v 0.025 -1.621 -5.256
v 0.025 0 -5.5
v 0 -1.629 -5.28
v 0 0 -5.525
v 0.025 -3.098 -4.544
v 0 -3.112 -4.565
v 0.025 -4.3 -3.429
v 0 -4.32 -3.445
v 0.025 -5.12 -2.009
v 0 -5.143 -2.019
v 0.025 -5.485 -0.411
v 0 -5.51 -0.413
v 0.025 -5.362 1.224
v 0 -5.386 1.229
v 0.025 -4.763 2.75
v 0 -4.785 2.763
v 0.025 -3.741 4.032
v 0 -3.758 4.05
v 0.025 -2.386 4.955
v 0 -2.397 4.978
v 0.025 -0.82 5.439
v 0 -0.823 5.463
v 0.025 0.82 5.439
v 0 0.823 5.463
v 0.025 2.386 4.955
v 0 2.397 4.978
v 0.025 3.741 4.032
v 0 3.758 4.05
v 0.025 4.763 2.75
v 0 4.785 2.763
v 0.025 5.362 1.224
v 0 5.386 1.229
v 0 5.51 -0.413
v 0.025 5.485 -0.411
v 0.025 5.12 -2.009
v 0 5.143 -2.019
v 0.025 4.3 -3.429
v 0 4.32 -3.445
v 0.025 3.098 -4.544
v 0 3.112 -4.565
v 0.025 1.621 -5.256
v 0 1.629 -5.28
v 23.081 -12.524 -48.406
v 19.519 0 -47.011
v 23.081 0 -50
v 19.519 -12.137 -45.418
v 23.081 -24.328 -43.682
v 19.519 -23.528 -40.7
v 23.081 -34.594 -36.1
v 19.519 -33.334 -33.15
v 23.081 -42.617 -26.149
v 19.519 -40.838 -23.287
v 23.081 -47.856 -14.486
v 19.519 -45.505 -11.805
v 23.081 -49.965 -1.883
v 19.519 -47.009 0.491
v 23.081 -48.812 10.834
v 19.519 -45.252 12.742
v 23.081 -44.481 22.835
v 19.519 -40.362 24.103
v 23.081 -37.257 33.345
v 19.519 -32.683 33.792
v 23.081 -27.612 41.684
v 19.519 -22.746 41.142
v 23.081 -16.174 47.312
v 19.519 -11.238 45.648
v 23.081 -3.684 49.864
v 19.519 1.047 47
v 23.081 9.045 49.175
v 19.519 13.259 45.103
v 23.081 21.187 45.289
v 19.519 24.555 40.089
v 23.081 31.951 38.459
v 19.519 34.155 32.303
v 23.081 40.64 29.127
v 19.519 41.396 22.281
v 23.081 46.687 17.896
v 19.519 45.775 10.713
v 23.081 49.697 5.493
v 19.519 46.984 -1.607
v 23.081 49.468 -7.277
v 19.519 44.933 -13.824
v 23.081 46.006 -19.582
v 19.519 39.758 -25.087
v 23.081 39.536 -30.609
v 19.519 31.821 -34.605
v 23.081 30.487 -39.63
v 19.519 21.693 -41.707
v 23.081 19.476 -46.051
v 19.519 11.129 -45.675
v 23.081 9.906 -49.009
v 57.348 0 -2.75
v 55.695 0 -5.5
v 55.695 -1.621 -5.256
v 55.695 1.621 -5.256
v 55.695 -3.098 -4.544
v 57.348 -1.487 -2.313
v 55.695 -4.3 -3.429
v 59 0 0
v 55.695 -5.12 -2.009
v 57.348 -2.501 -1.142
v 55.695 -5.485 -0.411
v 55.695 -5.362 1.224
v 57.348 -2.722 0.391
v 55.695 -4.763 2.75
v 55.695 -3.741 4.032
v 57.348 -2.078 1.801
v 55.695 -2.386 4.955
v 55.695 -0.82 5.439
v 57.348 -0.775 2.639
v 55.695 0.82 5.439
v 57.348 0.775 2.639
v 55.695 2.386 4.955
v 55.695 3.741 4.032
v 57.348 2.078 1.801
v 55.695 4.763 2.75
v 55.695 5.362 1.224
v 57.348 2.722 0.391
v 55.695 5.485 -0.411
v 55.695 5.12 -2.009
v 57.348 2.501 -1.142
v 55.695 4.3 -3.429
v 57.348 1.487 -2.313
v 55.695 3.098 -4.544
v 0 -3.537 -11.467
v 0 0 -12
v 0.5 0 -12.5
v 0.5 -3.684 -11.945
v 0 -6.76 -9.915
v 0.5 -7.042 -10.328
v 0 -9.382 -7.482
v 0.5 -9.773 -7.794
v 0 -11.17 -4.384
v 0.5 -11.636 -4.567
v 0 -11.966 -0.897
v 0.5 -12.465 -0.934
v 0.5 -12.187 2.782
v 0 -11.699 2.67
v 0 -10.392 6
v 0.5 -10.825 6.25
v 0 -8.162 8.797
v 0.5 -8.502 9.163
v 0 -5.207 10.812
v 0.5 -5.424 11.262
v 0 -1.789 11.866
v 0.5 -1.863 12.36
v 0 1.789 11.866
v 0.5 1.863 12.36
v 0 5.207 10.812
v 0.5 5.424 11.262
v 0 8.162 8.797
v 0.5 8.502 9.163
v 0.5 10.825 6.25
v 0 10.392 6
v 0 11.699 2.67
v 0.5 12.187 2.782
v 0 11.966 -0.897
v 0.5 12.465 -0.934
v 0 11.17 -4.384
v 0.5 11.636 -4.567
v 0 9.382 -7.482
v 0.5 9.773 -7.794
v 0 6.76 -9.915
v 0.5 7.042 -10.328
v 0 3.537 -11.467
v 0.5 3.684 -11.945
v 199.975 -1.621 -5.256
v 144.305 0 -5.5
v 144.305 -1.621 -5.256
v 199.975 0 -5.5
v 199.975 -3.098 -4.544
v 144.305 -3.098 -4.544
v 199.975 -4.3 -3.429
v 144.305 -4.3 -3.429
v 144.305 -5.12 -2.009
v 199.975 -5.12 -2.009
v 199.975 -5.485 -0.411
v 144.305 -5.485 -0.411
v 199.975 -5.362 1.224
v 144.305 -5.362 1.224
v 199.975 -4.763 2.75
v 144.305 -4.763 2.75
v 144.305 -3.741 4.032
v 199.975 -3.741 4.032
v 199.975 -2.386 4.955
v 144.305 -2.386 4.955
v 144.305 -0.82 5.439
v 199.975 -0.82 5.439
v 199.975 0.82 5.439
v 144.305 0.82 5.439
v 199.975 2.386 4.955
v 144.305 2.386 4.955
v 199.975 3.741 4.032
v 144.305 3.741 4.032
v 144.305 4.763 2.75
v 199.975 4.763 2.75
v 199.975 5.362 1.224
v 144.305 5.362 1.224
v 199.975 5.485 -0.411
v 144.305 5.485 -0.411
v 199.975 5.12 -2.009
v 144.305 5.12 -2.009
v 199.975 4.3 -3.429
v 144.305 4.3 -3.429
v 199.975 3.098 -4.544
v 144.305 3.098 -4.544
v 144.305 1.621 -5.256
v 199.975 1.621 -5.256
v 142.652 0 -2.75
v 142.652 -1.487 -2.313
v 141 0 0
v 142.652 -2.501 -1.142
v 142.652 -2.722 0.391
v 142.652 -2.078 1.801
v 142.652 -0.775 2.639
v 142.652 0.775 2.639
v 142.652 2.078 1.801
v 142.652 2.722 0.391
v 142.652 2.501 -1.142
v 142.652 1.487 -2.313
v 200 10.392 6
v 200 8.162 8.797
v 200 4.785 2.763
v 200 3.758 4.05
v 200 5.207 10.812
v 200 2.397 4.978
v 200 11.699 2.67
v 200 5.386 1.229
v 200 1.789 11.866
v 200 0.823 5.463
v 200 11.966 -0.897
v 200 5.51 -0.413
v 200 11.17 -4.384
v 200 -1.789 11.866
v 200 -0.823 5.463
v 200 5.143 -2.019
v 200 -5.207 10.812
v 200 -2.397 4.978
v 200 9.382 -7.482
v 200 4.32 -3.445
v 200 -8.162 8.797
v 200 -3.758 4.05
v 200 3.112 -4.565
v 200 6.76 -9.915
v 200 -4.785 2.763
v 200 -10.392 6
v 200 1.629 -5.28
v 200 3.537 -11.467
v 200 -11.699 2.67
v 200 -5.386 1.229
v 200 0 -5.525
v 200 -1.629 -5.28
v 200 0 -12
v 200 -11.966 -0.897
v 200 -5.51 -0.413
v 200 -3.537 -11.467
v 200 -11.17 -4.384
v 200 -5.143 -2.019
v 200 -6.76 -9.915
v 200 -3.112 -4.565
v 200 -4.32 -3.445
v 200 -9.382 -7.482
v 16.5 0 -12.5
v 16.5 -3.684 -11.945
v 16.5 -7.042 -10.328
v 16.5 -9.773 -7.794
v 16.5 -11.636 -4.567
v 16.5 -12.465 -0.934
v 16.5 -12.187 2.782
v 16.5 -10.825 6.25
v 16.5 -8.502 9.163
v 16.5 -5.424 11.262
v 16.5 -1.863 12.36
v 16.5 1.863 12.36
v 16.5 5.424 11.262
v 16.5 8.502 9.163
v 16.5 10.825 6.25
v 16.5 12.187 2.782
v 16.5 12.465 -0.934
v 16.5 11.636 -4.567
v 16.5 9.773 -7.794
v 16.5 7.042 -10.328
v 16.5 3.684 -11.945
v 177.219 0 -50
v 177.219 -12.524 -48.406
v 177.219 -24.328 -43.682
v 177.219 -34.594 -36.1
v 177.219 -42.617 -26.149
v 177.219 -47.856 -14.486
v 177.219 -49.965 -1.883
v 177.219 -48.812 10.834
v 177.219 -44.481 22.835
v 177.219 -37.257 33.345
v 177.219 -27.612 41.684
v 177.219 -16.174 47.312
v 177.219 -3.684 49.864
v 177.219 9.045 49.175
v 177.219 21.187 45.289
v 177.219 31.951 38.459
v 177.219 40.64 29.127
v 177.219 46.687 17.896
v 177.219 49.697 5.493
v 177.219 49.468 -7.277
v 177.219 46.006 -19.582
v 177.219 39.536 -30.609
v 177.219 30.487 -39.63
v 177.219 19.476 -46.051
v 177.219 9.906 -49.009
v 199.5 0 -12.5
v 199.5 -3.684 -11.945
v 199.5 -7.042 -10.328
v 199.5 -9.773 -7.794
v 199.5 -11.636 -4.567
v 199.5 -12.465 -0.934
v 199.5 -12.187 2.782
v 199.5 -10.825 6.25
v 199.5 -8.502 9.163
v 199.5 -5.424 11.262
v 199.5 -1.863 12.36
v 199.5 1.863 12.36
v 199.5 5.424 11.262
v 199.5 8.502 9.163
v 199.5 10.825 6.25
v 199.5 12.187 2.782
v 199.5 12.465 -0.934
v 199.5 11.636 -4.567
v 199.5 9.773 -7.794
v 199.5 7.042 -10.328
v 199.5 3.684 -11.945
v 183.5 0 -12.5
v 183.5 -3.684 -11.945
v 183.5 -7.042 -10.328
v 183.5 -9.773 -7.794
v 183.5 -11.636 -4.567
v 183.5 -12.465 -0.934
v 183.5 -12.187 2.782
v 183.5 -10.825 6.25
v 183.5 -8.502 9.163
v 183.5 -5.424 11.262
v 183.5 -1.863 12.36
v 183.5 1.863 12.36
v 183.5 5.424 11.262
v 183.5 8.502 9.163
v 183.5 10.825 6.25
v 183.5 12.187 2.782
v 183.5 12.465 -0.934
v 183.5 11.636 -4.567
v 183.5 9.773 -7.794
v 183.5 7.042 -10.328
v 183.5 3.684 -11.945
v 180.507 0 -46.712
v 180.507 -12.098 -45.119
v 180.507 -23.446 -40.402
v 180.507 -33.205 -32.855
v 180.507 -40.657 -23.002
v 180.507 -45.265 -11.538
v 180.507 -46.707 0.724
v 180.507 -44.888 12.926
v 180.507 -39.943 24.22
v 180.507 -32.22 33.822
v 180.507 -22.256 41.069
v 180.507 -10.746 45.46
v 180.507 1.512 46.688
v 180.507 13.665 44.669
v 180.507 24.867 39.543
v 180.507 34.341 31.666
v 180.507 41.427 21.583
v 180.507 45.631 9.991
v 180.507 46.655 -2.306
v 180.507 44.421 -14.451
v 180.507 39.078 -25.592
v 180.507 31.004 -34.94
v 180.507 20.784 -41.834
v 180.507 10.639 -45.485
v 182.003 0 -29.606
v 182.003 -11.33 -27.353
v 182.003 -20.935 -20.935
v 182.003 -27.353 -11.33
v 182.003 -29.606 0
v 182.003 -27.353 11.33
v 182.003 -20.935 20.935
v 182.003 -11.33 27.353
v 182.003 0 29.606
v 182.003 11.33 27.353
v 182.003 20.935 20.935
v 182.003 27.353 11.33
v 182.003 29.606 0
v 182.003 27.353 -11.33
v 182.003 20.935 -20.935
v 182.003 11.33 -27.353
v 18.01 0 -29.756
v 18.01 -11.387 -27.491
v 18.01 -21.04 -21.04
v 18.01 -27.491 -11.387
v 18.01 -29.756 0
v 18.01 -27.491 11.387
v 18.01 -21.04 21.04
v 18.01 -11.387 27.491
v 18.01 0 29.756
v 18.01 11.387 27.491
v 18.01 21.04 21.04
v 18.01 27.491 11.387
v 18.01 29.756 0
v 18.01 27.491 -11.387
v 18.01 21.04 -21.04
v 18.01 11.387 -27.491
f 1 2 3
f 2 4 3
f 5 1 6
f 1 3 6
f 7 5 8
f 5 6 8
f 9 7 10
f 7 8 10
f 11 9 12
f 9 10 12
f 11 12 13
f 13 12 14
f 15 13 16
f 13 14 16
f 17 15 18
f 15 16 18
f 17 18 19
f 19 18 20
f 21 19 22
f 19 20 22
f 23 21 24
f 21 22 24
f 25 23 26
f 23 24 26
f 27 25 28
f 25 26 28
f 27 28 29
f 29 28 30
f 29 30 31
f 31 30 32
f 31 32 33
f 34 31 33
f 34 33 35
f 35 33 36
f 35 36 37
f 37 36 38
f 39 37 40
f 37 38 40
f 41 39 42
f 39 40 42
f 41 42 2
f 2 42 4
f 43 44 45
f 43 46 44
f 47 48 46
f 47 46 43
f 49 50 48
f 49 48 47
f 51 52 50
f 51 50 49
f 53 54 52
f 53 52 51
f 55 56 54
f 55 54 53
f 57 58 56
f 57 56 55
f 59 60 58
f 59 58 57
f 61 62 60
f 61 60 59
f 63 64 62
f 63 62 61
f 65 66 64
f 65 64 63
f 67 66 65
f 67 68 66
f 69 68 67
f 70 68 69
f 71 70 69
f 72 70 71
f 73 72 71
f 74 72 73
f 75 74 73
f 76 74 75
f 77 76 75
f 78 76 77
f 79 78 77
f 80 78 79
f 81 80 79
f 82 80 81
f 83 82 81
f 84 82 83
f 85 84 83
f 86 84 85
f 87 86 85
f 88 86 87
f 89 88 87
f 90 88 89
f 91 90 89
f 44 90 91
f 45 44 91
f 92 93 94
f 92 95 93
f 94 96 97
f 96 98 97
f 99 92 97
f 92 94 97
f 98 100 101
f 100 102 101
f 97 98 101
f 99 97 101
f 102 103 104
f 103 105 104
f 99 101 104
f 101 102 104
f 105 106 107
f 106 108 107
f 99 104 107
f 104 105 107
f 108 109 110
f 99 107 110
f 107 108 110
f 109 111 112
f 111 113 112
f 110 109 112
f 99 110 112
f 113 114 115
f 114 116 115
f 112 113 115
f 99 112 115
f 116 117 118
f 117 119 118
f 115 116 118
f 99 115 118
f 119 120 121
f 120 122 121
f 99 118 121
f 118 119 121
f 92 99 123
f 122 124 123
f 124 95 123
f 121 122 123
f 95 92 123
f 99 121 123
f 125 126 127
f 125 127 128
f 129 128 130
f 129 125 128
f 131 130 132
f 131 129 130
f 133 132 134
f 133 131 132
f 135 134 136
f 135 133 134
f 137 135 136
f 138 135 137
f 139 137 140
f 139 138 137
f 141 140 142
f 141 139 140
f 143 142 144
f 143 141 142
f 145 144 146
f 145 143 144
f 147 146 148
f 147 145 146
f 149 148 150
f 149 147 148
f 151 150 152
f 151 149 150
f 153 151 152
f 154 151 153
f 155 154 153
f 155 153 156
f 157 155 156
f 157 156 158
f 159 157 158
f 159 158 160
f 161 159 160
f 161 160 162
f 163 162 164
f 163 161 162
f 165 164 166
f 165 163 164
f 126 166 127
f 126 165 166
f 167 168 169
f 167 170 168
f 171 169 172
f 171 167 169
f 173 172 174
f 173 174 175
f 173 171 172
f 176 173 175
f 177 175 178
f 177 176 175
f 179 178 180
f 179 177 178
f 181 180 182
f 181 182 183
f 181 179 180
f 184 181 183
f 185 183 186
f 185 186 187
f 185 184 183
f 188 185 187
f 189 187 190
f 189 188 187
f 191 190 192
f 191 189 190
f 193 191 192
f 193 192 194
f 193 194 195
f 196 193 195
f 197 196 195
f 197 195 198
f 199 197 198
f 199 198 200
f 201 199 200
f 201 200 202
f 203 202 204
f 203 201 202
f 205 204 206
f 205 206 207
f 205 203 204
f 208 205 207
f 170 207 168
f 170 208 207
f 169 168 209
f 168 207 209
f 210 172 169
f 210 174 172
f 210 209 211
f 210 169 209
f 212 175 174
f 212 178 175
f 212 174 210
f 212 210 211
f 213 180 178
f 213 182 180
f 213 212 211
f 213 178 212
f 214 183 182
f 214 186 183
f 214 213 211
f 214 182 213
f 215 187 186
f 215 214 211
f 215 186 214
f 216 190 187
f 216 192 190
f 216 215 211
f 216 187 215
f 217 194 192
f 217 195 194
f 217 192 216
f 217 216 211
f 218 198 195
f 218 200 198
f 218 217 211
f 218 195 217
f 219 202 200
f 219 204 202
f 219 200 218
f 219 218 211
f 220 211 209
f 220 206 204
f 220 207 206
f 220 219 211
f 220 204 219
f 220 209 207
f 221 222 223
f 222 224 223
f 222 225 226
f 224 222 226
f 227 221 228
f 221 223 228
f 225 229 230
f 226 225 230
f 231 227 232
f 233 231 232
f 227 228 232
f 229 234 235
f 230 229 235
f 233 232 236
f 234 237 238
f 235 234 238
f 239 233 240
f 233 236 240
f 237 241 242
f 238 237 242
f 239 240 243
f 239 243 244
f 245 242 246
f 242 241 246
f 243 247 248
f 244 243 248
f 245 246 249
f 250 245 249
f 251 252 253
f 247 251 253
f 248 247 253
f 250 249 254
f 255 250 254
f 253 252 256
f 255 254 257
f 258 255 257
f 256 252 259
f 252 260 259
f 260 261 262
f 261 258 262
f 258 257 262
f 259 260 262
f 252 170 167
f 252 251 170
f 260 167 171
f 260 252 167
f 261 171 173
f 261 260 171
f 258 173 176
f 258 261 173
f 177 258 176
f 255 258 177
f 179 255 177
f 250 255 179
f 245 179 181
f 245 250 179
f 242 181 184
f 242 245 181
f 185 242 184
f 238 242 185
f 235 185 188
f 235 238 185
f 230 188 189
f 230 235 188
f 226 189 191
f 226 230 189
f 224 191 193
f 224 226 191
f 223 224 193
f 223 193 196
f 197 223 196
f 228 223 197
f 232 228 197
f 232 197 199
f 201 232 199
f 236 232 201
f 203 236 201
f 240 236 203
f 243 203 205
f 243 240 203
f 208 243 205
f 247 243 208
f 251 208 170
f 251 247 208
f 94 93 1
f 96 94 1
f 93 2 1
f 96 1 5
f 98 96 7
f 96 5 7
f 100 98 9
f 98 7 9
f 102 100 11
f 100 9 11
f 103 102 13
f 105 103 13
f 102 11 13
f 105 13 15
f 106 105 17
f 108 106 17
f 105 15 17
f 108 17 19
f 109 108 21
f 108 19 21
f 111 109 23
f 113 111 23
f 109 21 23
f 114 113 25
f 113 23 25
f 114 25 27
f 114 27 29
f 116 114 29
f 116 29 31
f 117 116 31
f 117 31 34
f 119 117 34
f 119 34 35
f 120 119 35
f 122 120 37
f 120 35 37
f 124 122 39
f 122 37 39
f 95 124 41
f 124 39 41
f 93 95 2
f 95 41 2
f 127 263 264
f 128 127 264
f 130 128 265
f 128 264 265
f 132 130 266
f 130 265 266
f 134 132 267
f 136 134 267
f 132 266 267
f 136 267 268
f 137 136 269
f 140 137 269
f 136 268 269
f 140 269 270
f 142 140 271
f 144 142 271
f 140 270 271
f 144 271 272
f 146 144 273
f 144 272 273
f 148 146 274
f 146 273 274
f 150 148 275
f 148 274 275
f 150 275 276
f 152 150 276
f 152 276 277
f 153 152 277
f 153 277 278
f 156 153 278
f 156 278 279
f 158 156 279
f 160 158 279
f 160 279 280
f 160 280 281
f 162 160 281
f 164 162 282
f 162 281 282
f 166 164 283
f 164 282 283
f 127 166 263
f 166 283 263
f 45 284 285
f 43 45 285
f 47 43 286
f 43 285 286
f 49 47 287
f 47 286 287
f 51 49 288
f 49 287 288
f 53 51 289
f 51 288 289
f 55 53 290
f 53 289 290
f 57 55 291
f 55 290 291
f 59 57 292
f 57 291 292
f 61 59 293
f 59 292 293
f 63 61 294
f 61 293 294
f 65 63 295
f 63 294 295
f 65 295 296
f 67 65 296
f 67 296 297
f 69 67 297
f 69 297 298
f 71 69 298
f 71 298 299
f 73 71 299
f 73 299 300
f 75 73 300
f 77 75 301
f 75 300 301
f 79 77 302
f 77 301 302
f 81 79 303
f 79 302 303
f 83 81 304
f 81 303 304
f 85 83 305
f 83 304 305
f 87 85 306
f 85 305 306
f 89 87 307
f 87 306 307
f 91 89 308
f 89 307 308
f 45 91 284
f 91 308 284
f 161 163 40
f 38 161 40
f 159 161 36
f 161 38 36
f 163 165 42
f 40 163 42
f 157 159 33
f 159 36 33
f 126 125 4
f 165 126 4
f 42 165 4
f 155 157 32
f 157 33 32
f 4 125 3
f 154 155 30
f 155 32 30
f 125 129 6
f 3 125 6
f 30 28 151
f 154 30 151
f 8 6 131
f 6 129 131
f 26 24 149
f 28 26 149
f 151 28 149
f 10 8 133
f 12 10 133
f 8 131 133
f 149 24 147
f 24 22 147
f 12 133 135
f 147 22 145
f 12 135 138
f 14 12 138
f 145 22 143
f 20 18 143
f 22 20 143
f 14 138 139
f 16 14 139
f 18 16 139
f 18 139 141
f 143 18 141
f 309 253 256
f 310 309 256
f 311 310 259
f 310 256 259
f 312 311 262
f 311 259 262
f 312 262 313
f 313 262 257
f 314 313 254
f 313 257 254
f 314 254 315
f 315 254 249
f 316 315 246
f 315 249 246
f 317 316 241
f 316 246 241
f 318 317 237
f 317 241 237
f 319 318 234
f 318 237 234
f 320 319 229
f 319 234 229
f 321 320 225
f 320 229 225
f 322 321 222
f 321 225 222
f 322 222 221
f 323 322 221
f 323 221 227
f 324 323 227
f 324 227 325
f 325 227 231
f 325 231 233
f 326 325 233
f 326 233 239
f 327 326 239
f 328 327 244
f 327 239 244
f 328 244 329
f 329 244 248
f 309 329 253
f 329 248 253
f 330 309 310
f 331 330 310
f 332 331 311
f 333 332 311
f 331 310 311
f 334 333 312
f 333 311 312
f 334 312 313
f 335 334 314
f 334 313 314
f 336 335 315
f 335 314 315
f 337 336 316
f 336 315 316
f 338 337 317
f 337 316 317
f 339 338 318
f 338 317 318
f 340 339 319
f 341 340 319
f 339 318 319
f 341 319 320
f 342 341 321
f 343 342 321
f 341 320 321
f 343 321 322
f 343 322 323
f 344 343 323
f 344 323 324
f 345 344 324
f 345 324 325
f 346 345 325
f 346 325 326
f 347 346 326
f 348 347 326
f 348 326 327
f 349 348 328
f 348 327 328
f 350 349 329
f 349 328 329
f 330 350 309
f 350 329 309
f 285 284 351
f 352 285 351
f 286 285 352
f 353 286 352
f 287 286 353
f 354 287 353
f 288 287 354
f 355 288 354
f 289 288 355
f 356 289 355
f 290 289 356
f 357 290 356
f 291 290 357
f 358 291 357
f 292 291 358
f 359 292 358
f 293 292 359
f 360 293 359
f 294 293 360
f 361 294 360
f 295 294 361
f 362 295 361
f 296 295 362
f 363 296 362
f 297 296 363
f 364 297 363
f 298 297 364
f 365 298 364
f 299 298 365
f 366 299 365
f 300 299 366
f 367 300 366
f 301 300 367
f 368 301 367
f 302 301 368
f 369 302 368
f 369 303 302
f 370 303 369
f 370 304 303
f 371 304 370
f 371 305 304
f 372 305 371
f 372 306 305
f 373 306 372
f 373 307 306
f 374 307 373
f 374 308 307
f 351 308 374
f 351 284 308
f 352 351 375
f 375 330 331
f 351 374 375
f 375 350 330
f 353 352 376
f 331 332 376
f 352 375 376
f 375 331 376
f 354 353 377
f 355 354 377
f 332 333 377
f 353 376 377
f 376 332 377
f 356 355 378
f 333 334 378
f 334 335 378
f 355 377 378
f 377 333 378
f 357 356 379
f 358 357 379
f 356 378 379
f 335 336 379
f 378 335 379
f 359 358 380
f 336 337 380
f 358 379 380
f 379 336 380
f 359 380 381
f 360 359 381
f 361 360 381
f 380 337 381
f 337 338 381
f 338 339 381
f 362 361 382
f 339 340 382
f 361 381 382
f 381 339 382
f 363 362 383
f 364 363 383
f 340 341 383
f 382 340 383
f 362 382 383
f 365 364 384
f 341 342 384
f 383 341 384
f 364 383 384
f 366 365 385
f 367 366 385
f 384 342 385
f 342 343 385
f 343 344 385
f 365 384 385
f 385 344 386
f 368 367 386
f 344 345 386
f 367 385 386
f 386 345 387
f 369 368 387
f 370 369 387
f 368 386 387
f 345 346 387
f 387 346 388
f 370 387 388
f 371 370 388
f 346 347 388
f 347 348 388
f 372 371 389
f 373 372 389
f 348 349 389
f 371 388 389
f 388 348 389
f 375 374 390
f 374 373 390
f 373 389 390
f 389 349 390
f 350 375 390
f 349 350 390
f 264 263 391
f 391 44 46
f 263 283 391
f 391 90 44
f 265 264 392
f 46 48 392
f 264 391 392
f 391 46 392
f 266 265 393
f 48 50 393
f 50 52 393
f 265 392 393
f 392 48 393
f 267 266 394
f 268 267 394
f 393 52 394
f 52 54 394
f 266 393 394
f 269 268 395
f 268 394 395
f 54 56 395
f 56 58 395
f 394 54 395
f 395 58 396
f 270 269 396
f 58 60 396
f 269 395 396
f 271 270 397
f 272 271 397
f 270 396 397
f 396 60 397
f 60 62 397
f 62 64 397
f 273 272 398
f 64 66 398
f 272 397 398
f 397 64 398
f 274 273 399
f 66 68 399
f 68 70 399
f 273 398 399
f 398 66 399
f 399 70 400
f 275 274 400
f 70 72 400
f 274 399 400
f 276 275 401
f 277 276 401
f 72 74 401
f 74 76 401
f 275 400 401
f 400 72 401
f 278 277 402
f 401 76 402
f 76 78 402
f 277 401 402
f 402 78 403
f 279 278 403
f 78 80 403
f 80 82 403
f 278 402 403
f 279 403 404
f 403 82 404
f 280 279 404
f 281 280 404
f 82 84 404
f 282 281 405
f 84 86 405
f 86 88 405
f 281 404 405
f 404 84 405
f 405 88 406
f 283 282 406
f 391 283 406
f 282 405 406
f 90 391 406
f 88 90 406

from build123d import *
from OCP.BRepFilletAPI import BRepFilletAPI_MakeChamfer

# Parameters (mm, degrees)
CHAMFER1_SIZE  = 3
CHAMFER1_SIZE2 = 3.300188603
CHAMFER2_SIZE  = 0.5


with BuildPart() as part:
    # Sketch1 → Revolve1 (revolve)
    with BuildSketch(Plane(origin=(0, 0, 0), x_dir=(1, 0, 0), z_dir=(0, 1, 0))):
        Polygon((0, 0), (0, 12.5), (16.5, 12.5), (19.780824882, 50), (180.219175118, 50), (183.5, 12.5), (200, 12.5), (200, 0), align=None)
    revolve(axis=Axis((200, 0, 0), (-1, 0, 0)))

    # Chamfer1: one chamfer whose edges measure the first distance from different faces: ONE call of the kernel's chamfer builder (chamfer() names one face for all edges)
    chamfer1_edges_1 = [part.edges().sort_by_distance(p)[0] for p in [
        (180.219175118, 0, 50),
    ]]
    chamfer1_side_1 = [part.faces().sort_by_distance(p)[0] for p in [
        (100, 0, 50),
    ]]
    chamfer1_edges_2 = [part.edges().sort_by_distance(p)[0] for p in [
        (19.780824882, 0, 50),
    ]]
    chamfer1_side_2 = [part.faces().sort_by_distance(p)[0] for p in [
        (18.140412441, 0, 31.25),
    ]]
    chamfer1 = BRepFilletAPI_MakeChamfer(part.part.solid().wrapped)
    for e in chamfer1_edges_1:
        chamfer1.Add(CHAMFER1_SIZE, CHAMFER1_SIZE2, e.wrapped, chamfer1_side_1[0].wrapped)  # the first distance lies on this face
    for e in chamfer1_edges_2:
        chamfer1.Add(CHAMFER1_SIZE, CHAMFER1_SIZE2, e.wrapped, chamfer1_side_2[0].wrapped)  # the first distance lies on this face
    add(Compound.cast(chamfer1.Shape()), mode=Mode.REPLACE)

    # Chamfer2
    chamfer2_edges = [part.edges().sort_by_distance(p)[0] for p in [
        (200, 0, 12.5),
        (0, 0, 12.5),
    ]]
    chamfer(chamfer2_edges, length=CHAMFER2_SIZE)

    # Sketch3 → M10 Clearance Hole1 (revolve, cut)
    with BuildSketch(Plane(origin=(200, 0, 0), x_dir=(0, 0, -1), z_dir=(0, 1, 0))):
        Polygon((0, 0), (0, 59), (5.5, 55.695266595), (5.5, 0.025), (5.525, 0), align=None)
    m10_clearance_hole1 = revolve(axis=Axis((206.35, 0, 0), (-1, 0, 0)), mode=Mode.SUBTRACT)

    # Mirror1: M10 Clearance Hole1 across plane
    add(m10_clearance_hole1.mirror(Plane(origin=(100, 0, 0), x_dir=(0, 0, 1), z_dir=(1, 0, 0))), mode=Mode.SUBTRACT)


solid = part.part
